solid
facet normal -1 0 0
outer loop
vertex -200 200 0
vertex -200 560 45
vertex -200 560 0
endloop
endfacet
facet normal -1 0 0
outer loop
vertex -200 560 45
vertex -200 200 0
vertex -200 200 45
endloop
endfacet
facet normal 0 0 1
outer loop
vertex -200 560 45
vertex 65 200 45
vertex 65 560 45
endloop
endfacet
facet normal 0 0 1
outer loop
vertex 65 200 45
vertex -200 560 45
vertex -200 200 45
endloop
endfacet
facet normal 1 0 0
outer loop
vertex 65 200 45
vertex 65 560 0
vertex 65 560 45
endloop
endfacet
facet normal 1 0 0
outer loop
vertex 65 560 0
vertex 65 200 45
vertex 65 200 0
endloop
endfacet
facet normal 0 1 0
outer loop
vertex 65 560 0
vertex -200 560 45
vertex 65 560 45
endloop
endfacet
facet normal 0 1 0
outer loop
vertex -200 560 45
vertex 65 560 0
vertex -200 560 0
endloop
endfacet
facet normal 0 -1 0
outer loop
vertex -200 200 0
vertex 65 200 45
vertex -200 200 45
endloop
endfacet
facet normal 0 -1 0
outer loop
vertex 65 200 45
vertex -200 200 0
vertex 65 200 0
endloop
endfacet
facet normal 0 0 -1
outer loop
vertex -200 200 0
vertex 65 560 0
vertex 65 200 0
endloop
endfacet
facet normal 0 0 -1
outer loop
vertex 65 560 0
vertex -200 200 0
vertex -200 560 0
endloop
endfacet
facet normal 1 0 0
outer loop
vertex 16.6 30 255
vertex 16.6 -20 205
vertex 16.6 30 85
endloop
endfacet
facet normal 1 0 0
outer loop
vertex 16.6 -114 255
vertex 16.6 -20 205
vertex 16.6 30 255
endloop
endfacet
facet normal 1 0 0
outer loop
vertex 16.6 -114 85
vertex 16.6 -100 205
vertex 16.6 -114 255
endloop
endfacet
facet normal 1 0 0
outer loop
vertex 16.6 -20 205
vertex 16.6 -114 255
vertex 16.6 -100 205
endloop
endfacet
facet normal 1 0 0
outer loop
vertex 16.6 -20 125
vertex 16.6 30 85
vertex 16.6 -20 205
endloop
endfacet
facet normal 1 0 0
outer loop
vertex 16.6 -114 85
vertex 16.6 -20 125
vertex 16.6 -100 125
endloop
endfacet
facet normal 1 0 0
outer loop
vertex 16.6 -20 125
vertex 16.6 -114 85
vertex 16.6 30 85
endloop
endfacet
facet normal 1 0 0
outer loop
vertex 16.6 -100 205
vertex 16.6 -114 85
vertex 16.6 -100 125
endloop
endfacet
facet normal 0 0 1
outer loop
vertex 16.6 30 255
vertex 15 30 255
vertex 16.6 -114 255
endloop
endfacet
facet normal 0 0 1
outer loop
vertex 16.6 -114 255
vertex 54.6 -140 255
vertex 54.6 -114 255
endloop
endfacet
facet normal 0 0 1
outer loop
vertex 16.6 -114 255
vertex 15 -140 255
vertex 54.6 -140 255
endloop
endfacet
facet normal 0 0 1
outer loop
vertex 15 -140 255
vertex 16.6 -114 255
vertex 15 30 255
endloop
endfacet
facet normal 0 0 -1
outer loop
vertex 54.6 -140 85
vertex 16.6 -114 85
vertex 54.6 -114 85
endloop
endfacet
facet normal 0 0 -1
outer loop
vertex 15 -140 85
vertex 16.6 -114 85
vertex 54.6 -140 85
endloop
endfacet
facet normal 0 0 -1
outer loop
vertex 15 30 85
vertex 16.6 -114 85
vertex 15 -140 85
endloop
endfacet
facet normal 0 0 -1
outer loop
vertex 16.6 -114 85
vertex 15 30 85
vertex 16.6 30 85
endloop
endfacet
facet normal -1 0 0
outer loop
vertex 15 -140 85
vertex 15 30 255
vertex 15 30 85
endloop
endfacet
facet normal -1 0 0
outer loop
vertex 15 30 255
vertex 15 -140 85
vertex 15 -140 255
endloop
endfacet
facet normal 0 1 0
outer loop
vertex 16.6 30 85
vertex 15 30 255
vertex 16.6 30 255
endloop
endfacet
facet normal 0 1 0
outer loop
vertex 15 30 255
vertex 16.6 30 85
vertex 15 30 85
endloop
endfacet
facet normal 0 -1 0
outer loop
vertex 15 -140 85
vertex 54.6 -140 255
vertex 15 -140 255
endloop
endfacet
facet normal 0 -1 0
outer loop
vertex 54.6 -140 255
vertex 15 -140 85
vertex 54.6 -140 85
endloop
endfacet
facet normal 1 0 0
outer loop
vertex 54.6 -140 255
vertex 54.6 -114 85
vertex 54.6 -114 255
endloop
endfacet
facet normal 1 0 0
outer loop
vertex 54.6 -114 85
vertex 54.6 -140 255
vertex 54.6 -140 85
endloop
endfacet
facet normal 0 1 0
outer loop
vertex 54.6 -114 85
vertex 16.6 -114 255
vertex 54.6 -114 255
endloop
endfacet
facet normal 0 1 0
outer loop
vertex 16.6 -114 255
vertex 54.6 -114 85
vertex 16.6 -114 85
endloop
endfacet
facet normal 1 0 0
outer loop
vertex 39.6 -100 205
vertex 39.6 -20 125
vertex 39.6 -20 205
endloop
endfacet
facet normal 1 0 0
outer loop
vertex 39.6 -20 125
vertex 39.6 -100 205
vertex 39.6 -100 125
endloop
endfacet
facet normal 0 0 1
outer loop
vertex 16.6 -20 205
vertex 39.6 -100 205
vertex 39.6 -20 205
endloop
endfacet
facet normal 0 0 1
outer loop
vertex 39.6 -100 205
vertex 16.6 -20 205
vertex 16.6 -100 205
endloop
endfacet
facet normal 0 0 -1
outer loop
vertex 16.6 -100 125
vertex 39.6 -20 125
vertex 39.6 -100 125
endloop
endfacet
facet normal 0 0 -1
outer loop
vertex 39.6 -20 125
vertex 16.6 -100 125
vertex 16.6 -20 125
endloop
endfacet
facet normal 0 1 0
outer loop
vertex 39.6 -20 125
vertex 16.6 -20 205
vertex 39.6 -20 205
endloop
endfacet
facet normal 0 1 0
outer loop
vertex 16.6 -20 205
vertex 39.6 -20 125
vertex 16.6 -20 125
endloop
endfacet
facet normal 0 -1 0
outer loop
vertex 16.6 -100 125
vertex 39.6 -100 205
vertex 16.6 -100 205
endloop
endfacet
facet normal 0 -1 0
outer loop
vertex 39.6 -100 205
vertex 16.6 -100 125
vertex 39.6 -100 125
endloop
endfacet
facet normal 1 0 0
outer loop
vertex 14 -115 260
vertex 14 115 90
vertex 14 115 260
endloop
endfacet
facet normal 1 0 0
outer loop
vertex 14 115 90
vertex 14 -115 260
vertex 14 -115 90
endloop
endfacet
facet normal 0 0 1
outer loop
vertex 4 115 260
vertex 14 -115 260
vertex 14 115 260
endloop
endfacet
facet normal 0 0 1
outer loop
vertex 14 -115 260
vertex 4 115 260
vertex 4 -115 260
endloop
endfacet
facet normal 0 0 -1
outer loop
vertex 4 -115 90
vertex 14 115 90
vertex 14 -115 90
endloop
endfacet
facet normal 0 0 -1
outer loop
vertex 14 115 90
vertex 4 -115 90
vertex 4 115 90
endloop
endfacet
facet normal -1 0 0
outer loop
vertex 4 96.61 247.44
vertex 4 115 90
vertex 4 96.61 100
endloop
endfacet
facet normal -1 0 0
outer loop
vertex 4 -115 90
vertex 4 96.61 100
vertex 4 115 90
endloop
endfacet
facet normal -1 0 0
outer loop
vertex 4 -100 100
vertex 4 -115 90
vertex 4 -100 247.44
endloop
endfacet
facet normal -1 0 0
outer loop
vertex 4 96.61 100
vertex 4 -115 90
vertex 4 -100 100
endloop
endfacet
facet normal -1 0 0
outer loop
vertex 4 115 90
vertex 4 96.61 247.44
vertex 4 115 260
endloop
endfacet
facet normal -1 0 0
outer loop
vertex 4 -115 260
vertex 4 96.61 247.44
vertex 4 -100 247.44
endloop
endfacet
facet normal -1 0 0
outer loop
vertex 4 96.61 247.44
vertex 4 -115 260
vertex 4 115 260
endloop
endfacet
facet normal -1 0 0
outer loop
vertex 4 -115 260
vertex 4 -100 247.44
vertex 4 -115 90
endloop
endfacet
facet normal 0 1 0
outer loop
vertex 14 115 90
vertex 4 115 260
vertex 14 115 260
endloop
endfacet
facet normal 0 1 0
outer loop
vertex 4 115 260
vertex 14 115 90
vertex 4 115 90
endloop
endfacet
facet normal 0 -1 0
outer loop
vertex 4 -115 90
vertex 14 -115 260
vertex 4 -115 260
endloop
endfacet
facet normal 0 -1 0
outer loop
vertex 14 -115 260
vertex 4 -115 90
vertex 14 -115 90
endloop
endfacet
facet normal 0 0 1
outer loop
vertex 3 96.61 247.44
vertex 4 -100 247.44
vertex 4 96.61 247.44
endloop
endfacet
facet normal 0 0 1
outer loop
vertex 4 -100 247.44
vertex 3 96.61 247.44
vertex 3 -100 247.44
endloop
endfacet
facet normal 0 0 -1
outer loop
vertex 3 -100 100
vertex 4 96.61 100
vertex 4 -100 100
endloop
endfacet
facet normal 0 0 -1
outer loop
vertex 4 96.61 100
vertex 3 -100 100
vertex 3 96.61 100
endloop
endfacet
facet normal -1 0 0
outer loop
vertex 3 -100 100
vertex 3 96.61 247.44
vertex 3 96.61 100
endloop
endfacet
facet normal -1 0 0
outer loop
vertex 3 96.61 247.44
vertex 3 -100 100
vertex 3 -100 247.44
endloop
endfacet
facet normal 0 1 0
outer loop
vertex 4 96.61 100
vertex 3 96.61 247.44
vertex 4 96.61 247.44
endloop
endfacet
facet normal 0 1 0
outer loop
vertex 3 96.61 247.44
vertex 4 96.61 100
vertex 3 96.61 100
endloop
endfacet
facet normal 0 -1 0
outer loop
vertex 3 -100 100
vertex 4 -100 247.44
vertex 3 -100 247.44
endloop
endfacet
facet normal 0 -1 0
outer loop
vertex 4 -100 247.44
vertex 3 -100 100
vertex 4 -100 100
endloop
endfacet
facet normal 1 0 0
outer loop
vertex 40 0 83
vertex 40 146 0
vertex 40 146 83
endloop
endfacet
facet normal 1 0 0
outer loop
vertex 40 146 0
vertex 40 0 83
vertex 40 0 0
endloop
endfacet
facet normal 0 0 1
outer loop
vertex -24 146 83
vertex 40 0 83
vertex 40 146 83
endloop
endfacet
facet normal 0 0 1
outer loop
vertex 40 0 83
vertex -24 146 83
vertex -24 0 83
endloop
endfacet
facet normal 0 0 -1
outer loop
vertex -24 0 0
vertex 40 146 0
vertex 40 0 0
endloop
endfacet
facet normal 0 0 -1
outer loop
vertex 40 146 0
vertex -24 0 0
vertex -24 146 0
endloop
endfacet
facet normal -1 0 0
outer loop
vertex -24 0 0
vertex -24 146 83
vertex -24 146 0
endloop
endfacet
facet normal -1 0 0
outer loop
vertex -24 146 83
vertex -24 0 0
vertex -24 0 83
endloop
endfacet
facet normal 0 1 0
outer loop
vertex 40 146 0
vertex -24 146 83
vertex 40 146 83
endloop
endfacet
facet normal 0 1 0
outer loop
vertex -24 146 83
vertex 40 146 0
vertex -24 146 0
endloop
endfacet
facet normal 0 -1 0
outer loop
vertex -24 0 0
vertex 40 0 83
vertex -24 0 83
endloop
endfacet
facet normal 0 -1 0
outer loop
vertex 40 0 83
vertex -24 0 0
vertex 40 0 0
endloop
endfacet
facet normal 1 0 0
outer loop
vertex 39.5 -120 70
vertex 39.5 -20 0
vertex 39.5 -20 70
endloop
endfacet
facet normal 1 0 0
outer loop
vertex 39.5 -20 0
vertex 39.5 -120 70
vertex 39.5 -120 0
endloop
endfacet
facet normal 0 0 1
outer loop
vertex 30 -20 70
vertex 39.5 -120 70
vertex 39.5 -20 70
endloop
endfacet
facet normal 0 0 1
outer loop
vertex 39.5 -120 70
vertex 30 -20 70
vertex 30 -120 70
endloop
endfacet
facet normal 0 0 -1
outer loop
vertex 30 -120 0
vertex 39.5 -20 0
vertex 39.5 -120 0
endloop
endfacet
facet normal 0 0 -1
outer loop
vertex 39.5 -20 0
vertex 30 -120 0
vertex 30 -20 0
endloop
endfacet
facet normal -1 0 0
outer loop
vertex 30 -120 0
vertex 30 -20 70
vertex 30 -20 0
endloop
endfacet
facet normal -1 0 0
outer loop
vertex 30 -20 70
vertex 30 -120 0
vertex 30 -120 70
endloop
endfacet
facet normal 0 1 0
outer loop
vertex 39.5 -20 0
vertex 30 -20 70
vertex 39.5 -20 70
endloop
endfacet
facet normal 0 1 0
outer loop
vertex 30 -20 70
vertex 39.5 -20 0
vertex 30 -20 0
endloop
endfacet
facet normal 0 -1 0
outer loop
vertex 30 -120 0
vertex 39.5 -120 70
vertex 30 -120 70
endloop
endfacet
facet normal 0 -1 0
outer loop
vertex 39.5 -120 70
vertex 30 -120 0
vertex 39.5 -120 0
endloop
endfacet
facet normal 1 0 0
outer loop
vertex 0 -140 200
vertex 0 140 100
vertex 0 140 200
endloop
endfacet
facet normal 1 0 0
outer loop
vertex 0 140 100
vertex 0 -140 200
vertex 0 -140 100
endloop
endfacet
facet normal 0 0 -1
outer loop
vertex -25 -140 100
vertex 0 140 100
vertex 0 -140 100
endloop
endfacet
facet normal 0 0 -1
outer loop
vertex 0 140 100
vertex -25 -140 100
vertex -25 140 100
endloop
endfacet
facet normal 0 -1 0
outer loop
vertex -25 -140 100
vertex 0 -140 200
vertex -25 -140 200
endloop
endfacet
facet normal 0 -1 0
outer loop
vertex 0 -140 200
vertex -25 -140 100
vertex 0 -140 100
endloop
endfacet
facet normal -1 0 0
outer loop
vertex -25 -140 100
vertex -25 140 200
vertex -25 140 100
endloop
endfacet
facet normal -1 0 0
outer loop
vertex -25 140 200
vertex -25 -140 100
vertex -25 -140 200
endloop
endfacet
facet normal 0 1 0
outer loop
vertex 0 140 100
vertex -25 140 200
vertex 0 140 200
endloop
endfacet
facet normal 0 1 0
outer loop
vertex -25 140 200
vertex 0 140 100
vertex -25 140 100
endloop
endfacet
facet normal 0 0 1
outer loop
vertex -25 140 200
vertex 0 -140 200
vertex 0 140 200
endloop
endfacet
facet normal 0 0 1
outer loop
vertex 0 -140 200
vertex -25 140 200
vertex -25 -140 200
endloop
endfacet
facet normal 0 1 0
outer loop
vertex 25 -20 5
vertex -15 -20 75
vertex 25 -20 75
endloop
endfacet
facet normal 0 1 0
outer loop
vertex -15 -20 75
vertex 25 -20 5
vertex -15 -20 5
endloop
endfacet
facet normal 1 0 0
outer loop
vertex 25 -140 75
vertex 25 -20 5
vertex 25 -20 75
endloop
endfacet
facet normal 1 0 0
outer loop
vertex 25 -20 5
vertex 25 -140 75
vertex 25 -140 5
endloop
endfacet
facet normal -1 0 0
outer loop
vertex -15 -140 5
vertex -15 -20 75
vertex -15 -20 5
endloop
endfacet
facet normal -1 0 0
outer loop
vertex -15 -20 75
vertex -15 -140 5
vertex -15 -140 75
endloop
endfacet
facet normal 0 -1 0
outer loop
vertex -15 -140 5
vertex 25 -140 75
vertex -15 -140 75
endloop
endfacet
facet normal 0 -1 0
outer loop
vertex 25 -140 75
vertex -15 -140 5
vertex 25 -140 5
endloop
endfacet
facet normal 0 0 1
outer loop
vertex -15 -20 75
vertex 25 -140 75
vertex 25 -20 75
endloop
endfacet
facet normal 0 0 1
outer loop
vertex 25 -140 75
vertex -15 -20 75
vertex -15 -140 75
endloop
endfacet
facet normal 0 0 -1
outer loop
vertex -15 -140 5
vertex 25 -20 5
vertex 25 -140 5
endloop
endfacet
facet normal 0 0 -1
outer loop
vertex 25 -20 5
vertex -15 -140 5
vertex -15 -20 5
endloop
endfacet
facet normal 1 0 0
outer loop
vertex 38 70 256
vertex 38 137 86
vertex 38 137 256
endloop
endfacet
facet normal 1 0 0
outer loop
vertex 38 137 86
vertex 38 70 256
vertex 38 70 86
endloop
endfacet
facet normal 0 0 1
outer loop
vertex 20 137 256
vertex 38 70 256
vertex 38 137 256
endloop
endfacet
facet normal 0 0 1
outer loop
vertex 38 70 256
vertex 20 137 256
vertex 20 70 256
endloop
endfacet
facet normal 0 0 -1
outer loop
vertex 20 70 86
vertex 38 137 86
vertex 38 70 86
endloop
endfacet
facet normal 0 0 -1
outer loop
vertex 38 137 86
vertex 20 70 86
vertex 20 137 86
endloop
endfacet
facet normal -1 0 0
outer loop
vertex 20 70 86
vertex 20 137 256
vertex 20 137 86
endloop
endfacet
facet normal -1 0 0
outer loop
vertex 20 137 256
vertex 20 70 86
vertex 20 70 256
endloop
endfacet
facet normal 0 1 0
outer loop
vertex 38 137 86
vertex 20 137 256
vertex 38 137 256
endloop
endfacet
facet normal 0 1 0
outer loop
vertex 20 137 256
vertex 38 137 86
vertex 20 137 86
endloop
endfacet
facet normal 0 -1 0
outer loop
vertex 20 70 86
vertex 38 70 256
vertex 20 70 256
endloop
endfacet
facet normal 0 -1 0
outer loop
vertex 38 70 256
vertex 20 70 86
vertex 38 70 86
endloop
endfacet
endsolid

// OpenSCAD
translate([-200,200,0]) {
	color([0, 0, 0])
		cube([265, 360, 25]);
	
	translate([265-10, 0, 25+10])
		rotate([0, -180+110*$t,0]) {
			translate([-10, 0, -10])
				color([0, 0, 0])
					cube([265, 360, 20]);
			translate([5, 20, -9])
				color([.75, .75, .75])
					cube([240, 320, 20]);
		}
}

//PSU
translate([-24,0,0])
	color([0, 0, 0])
		cube([64, 146, 83]);

//Motherboard
translate([15,-140,85]) {
	color([.3,.6,.3])
		cube([1.6,170,170]);

	//Ports
	translate([1.6,0,0])
		color([.9,.9,.9])
			cube([38,26,170]);

	//Cooler
	translate([1.6,40,40])
		color([.9,.9,.9])
			cube([23,80,80]);
}

//SSD
translate([30,-120,0])
	color([.9,.9,.9])
		cube([9.5, 100, 70]);

//Keyboard
translate([-25,280/2,100])
	rotate([0,-90+90*$t,180])
		color([0, 1, 0])
			cube([100, 280, 25]);


//Mouse
translate([-115,-80,40])
	rotate([0,0,90-90*$t])
		translate([0,-120,0])
			rotate([90-90*$t,0,0])
				color([0, 0, 1])
					cube([120, 70, 40], center=true);

//graphics card
translate([20,70,86])
	cube([18, 67, 170]);

//screen
translate([4,-230/2,90]) {
			color([1, 0, 0])
				cube([10, 230, 170]);
		translate([-1,15,10])
			color([.9, .9, .9])
				cube([1, 196.61, 147.44]);
	}
